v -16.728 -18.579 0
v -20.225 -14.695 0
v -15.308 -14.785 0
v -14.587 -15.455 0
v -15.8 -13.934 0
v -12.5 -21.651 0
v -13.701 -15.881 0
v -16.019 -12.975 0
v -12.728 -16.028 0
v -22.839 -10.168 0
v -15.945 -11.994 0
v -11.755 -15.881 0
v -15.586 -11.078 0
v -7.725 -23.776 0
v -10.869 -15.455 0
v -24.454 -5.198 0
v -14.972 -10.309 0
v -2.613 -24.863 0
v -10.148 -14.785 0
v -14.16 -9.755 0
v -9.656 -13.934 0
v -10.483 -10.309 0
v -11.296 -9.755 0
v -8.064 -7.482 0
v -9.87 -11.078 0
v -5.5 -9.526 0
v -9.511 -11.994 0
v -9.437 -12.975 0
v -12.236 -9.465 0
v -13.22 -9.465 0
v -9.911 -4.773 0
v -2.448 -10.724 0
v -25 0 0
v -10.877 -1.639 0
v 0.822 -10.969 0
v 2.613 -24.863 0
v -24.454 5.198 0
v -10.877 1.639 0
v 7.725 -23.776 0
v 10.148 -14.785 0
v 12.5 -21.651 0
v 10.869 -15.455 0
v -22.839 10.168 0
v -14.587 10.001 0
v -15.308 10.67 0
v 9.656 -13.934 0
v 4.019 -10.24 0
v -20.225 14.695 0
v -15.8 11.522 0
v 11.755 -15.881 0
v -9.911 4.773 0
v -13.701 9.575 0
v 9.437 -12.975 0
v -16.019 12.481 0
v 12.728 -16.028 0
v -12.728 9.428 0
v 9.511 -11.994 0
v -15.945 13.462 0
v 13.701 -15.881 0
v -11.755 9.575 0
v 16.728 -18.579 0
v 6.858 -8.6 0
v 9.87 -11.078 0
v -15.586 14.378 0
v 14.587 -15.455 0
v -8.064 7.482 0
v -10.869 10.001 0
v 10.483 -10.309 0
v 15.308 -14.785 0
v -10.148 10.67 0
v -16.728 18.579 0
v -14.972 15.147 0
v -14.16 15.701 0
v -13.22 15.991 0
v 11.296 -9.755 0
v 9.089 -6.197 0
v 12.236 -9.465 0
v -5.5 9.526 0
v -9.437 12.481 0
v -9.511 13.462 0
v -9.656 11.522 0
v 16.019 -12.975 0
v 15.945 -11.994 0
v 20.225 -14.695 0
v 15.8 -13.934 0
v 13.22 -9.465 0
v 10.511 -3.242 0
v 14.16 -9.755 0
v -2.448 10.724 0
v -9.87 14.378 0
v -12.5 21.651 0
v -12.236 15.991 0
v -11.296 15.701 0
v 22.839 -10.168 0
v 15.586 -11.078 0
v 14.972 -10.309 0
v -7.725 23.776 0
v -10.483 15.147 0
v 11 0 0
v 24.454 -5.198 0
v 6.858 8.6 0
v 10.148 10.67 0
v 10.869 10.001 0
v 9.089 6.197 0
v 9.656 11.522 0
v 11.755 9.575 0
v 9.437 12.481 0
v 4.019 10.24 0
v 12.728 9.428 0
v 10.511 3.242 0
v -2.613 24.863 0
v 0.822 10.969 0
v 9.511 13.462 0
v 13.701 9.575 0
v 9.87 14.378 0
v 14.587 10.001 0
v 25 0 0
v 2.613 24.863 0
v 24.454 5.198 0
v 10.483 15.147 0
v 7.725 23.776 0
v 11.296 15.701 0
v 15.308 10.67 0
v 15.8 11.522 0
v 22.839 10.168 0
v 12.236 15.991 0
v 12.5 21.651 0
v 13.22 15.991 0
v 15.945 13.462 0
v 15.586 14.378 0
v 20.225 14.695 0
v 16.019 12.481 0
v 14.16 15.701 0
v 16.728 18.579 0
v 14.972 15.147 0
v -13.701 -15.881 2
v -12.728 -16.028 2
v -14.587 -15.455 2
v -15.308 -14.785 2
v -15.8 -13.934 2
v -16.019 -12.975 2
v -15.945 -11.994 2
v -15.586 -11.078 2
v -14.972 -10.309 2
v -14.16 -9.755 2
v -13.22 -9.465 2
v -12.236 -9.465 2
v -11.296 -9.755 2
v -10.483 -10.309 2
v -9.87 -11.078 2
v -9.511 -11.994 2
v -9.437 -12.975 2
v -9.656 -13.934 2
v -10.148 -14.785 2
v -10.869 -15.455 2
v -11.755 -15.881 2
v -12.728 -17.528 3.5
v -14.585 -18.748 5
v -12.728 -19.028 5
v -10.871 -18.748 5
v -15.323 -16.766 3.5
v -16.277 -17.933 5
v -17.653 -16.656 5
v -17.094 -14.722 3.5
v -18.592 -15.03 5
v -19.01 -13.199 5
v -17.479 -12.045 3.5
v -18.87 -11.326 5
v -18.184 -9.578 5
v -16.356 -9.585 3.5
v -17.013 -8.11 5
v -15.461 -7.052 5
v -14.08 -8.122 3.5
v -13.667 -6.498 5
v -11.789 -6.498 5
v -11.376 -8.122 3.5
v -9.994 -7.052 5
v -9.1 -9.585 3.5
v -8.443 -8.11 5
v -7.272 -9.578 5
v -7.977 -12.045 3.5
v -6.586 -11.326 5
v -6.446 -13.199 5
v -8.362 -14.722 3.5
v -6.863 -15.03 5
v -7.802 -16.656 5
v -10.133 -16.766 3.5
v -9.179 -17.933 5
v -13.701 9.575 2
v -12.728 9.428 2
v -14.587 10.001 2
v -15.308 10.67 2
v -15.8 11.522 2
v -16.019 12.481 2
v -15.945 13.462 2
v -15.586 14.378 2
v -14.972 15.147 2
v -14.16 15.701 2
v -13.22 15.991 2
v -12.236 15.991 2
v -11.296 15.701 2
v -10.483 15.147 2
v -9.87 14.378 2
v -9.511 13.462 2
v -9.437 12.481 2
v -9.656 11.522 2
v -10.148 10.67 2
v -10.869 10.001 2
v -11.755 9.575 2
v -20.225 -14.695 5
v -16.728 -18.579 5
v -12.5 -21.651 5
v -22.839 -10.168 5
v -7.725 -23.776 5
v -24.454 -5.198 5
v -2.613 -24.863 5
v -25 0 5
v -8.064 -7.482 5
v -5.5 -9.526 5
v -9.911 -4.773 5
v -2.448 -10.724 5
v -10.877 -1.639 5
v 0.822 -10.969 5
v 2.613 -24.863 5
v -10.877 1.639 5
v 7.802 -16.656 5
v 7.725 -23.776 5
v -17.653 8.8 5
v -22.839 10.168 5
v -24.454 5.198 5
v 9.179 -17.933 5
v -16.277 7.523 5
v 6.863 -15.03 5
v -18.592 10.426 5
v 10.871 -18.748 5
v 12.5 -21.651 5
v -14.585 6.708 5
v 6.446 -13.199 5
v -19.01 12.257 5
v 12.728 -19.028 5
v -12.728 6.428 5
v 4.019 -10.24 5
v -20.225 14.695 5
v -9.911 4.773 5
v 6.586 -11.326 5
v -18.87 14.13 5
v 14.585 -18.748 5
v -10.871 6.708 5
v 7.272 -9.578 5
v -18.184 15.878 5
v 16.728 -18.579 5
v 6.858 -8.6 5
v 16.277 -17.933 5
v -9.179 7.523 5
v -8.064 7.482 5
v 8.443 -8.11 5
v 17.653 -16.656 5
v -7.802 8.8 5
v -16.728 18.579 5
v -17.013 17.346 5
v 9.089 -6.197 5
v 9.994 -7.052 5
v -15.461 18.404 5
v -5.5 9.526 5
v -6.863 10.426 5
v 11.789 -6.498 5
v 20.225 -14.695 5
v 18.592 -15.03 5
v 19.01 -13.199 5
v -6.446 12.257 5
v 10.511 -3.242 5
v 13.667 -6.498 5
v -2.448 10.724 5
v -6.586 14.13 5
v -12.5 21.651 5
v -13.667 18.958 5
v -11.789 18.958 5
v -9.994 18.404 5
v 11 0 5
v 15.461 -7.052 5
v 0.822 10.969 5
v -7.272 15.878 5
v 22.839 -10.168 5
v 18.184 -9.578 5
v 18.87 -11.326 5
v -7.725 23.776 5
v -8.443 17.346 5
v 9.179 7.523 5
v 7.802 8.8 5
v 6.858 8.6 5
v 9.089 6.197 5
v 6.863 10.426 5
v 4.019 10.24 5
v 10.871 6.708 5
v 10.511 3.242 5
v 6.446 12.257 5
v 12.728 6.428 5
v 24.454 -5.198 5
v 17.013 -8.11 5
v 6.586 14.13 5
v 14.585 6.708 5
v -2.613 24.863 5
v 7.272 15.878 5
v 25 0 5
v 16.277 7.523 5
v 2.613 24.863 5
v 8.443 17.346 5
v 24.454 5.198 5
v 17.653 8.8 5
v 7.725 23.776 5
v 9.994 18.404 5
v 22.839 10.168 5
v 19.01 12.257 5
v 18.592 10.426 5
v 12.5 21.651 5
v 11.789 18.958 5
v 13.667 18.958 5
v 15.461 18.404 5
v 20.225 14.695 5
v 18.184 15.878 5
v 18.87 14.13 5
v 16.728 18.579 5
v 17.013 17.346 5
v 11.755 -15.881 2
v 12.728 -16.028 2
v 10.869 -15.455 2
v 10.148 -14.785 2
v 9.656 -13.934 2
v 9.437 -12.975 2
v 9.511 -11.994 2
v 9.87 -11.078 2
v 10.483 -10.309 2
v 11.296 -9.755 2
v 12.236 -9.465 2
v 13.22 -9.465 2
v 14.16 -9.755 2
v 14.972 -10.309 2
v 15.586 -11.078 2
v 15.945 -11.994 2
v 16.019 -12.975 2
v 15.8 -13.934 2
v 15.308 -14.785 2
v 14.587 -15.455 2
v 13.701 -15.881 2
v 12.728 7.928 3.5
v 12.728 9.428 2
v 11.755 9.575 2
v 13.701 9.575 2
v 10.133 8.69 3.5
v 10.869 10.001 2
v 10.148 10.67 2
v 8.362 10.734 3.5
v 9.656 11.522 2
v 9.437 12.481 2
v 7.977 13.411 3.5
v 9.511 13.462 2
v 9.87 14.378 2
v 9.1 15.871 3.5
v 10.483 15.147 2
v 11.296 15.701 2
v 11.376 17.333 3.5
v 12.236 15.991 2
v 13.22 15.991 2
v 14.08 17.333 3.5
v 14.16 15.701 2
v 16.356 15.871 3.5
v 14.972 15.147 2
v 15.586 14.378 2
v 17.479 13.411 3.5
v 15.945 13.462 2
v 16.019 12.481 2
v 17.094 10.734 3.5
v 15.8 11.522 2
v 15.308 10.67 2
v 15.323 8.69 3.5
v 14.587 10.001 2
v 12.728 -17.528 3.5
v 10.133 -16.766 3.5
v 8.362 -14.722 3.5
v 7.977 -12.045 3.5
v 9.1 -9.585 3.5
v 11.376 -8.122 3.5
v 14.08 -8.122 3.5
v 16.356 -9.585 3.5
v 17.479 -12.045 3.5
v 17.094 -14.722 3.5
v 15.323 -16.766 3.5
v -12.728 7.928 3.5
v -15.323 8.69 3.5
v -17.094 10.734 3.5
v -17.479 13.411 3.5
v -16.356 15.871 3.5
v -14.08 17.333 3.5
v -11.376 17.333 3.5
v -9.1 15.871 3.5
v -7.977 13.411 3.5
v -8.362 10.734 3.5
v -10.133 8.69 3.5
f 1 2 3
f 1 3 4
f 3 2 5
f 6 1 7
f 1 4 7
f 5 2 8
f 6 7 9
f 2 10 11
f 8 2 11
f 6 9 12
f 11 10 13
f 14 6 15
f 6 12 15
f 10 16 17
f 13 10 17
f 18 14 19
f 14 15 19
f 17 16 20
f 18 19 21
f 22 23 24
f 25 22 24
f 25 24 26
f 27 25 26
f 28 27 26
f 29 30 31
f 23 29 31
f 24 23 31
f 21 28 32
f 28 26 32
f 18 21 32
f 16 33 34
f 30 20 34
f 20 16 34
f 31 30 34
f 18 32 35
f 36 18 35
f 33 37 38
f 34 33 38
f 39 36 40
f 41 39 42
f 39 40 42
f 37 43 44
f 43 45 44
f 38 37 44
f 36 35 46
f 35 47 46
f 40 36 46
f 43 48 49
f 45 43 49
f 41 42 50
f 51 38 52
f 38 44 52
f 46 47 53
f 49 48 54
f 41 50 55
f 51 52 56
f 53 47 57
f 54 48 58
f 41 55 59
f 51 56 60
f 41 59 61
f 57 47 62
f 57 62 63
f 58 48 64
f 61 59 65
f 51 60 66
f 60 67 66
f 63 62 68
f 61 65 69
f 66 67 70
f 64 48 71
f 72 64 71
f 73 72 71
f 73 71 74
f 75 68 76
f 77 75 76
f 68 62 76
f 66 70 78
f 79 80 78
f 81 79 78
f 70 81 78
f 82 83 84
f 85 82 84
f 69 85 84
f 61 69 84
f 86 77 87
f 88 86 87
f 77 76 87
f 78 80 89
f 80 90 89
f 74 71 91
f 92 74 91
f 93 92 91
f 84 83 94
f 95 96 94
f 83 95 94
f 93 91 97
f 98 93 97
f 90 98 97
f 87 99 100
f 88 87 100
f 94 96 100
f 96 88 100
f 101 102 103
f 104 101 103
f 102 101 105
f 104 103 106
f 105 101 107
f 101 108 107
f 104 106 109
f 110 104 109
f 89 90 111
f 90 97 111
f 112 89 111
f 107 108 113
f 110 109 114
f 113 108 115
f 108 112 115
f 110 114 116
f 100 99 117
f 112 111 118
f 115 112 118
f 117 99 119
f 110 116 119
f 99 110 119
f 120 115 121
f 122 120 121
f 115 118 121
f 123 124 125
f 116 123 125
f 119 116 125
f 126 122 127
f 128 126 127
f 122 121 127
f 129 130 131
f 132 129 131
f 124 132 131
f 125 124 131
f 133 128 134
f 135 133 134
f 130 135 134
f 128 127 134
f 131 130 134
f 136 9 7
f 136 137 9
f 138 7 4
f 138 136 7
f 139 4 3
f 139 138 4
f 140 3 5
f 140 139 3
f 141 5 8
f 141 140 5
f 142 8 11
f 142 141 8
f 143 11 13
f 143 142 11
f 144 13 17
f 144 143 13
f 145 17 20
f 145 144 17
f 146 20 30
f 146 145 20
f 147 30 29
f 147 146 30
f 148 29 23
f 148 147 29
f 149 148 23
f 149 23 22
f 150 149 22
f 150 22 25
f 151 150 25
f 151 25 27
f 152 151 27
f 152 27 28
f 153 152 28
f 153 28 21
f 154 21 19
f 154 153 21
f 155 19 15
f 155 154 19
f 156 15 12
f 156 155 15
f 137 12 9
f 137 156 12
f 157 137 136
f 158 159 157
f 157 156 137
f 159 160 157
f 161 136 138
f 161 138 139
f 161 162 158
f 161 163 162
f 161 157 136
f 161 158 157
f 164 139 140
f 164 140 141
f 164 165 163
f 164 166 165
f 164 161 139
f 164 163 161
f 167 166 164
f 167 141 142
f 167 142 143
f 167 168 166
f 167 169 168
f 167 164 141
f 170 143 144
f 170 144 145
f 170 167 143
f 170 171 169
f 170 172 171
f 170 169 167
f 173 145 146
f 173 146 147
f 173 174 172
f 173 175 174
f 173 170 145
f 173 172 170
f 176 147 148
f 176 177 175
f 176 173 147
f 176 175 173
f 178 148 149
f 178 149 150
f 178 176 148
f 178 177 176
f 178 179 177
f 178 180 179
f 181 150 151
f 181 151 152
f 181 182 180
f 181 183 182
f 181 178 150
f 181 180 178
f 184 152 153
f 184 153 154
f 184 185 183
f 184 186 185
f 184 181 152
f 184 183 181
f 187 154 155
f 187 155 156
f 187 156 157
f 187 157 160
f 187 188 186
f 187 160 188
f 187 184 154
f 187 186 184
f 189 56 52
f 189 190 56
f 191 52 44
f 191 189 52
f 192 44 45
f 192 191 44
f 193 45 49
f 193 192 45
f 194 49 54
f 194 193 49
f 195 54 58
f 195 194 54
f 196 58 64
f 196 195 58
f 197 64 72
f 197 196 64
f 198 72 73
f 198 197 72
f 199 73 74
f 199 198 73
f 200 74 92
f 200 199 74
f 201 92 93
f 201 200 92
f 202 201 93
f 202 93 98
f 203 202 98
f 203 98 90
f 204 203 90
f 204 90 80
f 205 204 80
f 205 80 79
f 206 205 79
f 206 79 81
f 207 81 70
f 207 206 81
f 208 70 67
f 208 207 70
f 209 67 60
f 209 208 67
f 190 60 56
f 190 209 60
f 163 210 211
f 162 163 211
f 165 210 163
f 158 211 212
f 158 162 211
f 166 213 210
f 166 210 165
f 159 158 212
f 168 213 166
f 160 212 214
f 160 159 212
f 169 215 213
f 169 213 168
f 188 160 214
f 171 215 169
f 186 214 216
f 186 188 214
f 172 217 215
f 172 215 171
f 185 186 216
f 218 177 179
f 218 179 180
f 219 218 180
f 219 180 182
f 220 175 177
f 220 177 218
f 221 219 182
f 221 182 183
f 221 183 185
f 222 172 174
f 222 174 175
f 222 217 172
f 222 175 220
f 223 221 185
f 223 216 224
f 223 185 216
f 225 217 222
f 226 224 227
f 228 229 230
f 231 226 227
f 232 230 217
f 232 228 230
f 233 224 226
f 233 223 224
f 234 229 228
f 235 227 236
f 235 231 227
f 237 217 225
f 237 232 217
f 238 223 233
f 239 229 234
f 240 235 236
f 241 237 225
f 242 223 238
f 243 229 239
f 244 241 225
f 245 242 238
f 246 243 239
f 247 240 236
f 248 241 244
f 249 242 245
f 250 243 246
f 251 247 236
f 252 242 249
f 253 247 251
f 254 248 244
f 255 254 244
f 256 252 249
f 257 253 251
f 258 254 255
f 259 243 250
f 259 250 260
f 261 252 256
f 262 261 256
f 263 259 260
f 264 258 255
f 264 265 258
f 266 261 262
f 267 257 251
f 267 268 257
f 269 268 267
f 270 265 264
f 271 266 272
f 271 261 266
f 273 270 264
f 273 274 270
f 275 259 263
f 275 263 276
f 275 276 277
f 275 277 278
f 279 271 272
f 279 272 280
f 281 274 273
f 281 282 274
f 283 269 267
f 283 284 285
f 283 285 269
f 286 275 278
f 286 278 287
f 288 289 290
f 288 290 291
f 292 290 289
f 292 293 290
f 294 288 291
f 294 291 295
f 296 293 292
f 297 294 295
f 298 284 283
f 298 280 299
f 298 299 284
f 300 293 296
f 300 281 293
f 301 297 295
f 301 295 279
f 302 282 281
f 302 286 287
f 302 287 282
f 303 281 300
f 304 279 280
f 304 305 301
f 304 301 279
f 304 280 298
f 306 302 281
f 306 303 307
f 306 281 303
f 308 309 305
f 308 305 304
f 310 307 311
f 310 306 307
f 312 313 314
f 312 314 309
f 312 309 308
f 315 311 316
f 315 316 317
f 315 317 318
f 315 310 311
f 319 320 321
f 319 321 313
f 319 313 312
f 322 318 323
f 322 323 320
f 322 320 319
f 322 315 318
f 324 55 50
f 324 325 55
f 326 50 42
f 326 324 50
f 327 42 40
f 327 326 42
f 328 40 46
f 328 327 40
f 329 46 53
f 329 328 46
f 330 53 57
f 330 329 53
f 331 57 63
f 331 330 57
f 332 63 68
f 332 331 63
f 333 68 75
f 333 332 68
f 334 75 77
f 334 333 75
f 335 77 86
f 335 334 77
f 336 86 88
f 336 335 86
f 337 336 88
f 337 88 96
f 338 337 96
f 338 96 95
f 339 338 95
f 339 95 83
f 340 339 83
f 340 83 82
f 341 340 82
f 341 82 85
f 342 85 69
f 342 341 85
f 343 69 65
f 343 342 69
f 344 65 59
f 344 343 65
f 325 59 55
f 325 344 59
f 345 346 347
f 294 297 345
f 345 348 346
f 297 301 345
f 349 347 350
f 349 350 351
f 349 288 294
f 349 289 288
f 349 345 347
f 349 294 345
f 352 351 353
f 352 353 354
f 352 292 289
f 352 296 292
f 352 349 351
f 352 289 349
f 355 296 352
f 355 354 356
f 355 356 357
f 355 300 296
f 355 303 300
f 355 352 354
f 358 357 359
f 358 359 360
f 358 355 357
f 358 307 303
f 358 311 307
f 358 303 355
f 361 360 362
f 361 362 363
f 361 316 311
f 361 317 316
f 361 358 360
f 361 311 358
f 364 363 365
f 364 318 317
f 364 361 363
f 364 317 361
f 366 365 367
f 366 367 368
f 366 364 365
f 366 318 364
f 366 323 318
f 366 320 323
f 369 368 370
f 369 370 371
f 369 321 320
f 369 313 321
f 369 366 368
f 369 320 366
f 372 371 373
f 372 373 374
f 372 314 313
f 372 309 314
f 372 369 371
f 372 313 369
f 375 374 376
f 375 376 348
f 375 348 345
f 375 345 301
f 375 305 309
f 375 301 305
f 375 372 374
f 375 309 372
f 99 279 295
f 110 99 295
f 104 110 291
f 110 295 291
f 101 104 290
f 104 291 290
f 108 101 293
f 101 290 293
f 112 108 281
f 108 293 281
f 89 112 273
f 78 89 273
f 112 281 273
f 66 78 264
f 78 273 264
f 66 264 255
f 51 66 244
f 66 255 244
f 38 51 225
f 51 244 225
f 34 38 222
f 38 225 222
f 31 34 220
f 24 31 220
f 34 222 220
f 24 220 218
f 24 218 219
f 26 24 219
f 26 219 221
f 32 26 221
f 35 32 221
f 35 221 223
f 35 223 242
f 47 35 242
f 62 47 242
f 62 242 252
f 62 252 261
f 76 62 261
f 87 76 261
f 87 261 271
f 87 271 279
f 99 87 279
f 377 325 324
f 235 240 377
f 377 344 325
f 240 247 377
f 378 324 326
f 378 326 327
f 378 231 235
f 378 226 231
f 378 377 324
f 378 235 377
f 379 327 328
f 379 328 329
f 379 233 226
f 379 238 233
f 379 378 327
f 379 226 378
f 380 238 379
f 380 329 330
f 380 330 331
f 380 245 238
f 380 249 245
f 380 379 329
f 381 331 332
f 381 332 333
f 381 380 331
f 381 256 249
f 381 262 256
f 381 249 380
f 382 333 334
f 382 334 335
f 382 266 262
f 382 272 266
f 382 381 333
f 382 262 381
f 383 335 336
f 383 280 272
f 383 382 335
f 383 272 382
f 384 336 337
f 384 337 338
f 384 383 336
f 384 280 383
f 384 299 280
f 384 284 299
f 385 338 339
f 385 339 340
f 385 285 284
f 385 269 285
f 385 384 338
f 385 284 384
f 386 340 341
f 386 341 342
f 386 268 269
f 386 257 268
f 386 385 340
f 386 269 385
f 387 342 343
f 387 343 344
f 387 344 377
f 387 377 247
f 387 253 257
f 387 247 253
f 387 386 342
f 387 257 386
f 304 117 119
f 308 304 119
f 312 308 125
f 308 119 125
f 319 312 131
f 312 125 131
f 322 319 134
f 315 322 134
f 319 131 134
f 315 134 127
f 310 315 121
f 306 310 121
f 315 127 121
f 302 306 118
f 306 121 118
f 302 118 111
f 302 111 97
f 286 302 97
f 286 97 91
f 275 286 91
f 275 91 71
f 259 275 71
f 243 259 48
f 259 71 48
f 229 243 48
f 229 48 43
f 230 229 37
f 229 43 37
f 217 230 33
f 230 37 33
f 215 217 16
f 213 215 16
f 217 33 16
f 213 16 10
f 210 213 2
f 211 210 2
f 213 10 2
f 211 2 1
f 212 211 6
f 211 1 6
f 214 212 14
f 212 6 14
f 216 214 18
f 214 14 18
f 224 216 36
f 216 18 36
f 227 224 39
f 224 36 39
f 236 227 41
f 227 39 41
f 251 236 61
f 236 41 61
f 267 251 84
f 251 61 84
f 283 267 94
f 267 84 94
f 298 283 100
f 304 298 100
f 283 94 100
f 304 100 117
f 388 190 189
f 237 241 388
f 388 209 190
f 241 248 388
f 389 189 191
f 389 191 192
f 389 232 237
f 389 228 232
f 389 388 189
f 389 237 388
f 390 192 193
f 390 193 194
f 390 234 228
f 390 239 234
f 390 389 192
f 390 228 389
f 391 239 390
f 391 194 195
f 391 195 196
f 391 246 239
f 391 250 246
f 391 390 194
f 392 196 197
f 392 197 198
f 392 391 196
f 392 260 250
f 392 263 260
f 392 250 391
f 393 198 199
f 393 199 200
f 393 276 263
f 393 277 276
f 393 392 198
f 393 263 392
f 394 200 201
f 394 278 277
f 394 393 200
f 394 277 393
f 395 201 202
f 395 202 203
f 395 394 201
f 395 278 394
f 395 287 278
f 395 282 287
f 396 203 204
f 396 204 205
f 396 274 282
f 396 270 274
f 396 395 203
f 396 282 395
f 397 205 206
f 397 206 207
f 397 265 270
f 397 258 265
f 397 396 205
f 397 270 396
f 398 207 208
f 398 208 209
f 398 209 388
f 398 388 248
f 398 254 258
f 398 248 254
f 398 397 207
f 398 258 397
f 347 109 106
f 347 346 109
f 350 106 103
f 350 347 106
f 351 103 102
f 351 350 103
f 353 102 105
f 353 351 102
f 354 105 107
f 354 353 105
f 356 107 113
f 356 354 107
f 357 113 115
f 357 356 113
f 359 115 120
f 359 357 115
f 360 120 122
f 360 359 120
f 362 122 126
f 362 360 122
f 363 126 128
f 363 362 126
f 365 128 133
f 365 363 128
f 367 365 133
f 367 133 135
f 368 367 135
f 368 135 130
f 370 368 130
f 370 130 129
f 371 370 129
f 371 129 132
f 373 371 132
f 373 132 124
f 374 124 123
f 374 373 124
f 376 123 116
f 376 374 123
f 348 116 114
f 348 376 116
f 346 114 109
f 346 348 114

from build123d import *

# Parameters (mm, degrees)
ESQUISSE1_R                                 = 25
BOSS_EXTRU_1_DEPTH                          = 5
ESQUISSE2_R                                 = 11
ENL_V_MAT_EXTRU_1_DEPTH                     = 6
FRAISAGE_POUR_VIS_T_TE_FRAIS_E_M61_AT_COUNT = 2
FRAISAGE_POUR_VIS_T_TE_FRAIS_E_M61_AT_PITCH = 36
FRAISAGE_POUR_VIS_T_TE_FRAIS_E_M61_2_COUNT  = 2
FRAISAGE_POUR_VIS_T_TE_FRAIS_E_M61_2_PITCH  = 25.455844123
FRAISAGE_POUR_VIS_T_TE_FRAIS_E_M61_3_COUNT  = 2
FRAISAGE_POUR_VIS_T_TE_FRAIS_E_M61_3_PITCH  = 25.455844123


with BuildPart() as part:
    # Esquisse1 → Boss.-Extru.1 (new body)
    with BuildSketch(Plane.XY):
        Circle(ESQUISSE1_R)
    extrude(amount=BOSS_EXTRU_1_DEPTH)

    # Esquisse2 → Enlèv. mat.-Extru.1 (cut, through all)
    with BuildSketch(Plane.XY.offset(5)):
        Circle(ESQUISSE2_R)
    extrude(amount=-ENL_V_MAT_EXTRU_1_DEPTH, mode=Mode.SUBTRACT)

    # Esquisse8 → Fraisage pour vis à tête fraisée M61 (revolve, cut)
    with BuildSketch(Plane(origin=(12.727922061, 12.727922061, 5), x_dir=(0, -1, 0), z_dir=(1, 0, 0))):
        Polygon((0, 0), (0, 5), (3.3, 5), (3.3, 3), (6.3, 0), align=None)
    fraisage_pour_vis_t_te_frais_e_m61 = revolve(axis=Axis((12.727922061, 12.727922061, 11.35), (0, 0, -1)), mode=Mode.SUBTRACT)

    # Fraisage pour vis à tête fraisée M61 at: Fraisage pour vis à tête fraisée M61 ×2
    with Locations(*[Vector(-0.707106781, -0.707106781, 0) * (i * FRAISAGE_POUR_VIS_T_TE_FRAIS_E_M61_AT_PITCH) for i in range(1, FRAISAGE_POUR_VIS_T_TE_FRAIS_E_M61_AT_COUNT)]):
        add(fraisage_pour_vis_t_te_frais_e_m61, mode=Mode.SUBTRACT)

    # Fraisage pour vis _ t_te frais_e M61 2: Fraisage pour vis à tête fraisée M61 ×2
    with Locations(*[(-i * FRAISAGE_POUR_VIS_T_TE_FRAIS_E_M61_2_PITCH, 0, 0) for i in range(1, FRAISAGE_POUR_VIS_T_TE_FRAIS_E_M61_2_COUNT)]):
        add(fraisage_pour_vis_t_te_frais_e_m61, mode=Mode.SUBTRACT)

    # Fraisage pour vis _ t_te frais_e M61 3: Fraisage pour vis à tête fraisée M61 ×2
    with Locations(*[(0, -i * FRAISAGE_POUR_VIS_T_TE_FRAIS_E_M61_3_PITCH, 0) for i in range(1, FRAISAGE_POUR_VIS_T_TE_FRAIS_E_M61_3_COUNT)]):
        add(fraisage_pour_vis_t_te_frais_e_m61, mode=Mode.SUBTRACT)


solid = part.part
